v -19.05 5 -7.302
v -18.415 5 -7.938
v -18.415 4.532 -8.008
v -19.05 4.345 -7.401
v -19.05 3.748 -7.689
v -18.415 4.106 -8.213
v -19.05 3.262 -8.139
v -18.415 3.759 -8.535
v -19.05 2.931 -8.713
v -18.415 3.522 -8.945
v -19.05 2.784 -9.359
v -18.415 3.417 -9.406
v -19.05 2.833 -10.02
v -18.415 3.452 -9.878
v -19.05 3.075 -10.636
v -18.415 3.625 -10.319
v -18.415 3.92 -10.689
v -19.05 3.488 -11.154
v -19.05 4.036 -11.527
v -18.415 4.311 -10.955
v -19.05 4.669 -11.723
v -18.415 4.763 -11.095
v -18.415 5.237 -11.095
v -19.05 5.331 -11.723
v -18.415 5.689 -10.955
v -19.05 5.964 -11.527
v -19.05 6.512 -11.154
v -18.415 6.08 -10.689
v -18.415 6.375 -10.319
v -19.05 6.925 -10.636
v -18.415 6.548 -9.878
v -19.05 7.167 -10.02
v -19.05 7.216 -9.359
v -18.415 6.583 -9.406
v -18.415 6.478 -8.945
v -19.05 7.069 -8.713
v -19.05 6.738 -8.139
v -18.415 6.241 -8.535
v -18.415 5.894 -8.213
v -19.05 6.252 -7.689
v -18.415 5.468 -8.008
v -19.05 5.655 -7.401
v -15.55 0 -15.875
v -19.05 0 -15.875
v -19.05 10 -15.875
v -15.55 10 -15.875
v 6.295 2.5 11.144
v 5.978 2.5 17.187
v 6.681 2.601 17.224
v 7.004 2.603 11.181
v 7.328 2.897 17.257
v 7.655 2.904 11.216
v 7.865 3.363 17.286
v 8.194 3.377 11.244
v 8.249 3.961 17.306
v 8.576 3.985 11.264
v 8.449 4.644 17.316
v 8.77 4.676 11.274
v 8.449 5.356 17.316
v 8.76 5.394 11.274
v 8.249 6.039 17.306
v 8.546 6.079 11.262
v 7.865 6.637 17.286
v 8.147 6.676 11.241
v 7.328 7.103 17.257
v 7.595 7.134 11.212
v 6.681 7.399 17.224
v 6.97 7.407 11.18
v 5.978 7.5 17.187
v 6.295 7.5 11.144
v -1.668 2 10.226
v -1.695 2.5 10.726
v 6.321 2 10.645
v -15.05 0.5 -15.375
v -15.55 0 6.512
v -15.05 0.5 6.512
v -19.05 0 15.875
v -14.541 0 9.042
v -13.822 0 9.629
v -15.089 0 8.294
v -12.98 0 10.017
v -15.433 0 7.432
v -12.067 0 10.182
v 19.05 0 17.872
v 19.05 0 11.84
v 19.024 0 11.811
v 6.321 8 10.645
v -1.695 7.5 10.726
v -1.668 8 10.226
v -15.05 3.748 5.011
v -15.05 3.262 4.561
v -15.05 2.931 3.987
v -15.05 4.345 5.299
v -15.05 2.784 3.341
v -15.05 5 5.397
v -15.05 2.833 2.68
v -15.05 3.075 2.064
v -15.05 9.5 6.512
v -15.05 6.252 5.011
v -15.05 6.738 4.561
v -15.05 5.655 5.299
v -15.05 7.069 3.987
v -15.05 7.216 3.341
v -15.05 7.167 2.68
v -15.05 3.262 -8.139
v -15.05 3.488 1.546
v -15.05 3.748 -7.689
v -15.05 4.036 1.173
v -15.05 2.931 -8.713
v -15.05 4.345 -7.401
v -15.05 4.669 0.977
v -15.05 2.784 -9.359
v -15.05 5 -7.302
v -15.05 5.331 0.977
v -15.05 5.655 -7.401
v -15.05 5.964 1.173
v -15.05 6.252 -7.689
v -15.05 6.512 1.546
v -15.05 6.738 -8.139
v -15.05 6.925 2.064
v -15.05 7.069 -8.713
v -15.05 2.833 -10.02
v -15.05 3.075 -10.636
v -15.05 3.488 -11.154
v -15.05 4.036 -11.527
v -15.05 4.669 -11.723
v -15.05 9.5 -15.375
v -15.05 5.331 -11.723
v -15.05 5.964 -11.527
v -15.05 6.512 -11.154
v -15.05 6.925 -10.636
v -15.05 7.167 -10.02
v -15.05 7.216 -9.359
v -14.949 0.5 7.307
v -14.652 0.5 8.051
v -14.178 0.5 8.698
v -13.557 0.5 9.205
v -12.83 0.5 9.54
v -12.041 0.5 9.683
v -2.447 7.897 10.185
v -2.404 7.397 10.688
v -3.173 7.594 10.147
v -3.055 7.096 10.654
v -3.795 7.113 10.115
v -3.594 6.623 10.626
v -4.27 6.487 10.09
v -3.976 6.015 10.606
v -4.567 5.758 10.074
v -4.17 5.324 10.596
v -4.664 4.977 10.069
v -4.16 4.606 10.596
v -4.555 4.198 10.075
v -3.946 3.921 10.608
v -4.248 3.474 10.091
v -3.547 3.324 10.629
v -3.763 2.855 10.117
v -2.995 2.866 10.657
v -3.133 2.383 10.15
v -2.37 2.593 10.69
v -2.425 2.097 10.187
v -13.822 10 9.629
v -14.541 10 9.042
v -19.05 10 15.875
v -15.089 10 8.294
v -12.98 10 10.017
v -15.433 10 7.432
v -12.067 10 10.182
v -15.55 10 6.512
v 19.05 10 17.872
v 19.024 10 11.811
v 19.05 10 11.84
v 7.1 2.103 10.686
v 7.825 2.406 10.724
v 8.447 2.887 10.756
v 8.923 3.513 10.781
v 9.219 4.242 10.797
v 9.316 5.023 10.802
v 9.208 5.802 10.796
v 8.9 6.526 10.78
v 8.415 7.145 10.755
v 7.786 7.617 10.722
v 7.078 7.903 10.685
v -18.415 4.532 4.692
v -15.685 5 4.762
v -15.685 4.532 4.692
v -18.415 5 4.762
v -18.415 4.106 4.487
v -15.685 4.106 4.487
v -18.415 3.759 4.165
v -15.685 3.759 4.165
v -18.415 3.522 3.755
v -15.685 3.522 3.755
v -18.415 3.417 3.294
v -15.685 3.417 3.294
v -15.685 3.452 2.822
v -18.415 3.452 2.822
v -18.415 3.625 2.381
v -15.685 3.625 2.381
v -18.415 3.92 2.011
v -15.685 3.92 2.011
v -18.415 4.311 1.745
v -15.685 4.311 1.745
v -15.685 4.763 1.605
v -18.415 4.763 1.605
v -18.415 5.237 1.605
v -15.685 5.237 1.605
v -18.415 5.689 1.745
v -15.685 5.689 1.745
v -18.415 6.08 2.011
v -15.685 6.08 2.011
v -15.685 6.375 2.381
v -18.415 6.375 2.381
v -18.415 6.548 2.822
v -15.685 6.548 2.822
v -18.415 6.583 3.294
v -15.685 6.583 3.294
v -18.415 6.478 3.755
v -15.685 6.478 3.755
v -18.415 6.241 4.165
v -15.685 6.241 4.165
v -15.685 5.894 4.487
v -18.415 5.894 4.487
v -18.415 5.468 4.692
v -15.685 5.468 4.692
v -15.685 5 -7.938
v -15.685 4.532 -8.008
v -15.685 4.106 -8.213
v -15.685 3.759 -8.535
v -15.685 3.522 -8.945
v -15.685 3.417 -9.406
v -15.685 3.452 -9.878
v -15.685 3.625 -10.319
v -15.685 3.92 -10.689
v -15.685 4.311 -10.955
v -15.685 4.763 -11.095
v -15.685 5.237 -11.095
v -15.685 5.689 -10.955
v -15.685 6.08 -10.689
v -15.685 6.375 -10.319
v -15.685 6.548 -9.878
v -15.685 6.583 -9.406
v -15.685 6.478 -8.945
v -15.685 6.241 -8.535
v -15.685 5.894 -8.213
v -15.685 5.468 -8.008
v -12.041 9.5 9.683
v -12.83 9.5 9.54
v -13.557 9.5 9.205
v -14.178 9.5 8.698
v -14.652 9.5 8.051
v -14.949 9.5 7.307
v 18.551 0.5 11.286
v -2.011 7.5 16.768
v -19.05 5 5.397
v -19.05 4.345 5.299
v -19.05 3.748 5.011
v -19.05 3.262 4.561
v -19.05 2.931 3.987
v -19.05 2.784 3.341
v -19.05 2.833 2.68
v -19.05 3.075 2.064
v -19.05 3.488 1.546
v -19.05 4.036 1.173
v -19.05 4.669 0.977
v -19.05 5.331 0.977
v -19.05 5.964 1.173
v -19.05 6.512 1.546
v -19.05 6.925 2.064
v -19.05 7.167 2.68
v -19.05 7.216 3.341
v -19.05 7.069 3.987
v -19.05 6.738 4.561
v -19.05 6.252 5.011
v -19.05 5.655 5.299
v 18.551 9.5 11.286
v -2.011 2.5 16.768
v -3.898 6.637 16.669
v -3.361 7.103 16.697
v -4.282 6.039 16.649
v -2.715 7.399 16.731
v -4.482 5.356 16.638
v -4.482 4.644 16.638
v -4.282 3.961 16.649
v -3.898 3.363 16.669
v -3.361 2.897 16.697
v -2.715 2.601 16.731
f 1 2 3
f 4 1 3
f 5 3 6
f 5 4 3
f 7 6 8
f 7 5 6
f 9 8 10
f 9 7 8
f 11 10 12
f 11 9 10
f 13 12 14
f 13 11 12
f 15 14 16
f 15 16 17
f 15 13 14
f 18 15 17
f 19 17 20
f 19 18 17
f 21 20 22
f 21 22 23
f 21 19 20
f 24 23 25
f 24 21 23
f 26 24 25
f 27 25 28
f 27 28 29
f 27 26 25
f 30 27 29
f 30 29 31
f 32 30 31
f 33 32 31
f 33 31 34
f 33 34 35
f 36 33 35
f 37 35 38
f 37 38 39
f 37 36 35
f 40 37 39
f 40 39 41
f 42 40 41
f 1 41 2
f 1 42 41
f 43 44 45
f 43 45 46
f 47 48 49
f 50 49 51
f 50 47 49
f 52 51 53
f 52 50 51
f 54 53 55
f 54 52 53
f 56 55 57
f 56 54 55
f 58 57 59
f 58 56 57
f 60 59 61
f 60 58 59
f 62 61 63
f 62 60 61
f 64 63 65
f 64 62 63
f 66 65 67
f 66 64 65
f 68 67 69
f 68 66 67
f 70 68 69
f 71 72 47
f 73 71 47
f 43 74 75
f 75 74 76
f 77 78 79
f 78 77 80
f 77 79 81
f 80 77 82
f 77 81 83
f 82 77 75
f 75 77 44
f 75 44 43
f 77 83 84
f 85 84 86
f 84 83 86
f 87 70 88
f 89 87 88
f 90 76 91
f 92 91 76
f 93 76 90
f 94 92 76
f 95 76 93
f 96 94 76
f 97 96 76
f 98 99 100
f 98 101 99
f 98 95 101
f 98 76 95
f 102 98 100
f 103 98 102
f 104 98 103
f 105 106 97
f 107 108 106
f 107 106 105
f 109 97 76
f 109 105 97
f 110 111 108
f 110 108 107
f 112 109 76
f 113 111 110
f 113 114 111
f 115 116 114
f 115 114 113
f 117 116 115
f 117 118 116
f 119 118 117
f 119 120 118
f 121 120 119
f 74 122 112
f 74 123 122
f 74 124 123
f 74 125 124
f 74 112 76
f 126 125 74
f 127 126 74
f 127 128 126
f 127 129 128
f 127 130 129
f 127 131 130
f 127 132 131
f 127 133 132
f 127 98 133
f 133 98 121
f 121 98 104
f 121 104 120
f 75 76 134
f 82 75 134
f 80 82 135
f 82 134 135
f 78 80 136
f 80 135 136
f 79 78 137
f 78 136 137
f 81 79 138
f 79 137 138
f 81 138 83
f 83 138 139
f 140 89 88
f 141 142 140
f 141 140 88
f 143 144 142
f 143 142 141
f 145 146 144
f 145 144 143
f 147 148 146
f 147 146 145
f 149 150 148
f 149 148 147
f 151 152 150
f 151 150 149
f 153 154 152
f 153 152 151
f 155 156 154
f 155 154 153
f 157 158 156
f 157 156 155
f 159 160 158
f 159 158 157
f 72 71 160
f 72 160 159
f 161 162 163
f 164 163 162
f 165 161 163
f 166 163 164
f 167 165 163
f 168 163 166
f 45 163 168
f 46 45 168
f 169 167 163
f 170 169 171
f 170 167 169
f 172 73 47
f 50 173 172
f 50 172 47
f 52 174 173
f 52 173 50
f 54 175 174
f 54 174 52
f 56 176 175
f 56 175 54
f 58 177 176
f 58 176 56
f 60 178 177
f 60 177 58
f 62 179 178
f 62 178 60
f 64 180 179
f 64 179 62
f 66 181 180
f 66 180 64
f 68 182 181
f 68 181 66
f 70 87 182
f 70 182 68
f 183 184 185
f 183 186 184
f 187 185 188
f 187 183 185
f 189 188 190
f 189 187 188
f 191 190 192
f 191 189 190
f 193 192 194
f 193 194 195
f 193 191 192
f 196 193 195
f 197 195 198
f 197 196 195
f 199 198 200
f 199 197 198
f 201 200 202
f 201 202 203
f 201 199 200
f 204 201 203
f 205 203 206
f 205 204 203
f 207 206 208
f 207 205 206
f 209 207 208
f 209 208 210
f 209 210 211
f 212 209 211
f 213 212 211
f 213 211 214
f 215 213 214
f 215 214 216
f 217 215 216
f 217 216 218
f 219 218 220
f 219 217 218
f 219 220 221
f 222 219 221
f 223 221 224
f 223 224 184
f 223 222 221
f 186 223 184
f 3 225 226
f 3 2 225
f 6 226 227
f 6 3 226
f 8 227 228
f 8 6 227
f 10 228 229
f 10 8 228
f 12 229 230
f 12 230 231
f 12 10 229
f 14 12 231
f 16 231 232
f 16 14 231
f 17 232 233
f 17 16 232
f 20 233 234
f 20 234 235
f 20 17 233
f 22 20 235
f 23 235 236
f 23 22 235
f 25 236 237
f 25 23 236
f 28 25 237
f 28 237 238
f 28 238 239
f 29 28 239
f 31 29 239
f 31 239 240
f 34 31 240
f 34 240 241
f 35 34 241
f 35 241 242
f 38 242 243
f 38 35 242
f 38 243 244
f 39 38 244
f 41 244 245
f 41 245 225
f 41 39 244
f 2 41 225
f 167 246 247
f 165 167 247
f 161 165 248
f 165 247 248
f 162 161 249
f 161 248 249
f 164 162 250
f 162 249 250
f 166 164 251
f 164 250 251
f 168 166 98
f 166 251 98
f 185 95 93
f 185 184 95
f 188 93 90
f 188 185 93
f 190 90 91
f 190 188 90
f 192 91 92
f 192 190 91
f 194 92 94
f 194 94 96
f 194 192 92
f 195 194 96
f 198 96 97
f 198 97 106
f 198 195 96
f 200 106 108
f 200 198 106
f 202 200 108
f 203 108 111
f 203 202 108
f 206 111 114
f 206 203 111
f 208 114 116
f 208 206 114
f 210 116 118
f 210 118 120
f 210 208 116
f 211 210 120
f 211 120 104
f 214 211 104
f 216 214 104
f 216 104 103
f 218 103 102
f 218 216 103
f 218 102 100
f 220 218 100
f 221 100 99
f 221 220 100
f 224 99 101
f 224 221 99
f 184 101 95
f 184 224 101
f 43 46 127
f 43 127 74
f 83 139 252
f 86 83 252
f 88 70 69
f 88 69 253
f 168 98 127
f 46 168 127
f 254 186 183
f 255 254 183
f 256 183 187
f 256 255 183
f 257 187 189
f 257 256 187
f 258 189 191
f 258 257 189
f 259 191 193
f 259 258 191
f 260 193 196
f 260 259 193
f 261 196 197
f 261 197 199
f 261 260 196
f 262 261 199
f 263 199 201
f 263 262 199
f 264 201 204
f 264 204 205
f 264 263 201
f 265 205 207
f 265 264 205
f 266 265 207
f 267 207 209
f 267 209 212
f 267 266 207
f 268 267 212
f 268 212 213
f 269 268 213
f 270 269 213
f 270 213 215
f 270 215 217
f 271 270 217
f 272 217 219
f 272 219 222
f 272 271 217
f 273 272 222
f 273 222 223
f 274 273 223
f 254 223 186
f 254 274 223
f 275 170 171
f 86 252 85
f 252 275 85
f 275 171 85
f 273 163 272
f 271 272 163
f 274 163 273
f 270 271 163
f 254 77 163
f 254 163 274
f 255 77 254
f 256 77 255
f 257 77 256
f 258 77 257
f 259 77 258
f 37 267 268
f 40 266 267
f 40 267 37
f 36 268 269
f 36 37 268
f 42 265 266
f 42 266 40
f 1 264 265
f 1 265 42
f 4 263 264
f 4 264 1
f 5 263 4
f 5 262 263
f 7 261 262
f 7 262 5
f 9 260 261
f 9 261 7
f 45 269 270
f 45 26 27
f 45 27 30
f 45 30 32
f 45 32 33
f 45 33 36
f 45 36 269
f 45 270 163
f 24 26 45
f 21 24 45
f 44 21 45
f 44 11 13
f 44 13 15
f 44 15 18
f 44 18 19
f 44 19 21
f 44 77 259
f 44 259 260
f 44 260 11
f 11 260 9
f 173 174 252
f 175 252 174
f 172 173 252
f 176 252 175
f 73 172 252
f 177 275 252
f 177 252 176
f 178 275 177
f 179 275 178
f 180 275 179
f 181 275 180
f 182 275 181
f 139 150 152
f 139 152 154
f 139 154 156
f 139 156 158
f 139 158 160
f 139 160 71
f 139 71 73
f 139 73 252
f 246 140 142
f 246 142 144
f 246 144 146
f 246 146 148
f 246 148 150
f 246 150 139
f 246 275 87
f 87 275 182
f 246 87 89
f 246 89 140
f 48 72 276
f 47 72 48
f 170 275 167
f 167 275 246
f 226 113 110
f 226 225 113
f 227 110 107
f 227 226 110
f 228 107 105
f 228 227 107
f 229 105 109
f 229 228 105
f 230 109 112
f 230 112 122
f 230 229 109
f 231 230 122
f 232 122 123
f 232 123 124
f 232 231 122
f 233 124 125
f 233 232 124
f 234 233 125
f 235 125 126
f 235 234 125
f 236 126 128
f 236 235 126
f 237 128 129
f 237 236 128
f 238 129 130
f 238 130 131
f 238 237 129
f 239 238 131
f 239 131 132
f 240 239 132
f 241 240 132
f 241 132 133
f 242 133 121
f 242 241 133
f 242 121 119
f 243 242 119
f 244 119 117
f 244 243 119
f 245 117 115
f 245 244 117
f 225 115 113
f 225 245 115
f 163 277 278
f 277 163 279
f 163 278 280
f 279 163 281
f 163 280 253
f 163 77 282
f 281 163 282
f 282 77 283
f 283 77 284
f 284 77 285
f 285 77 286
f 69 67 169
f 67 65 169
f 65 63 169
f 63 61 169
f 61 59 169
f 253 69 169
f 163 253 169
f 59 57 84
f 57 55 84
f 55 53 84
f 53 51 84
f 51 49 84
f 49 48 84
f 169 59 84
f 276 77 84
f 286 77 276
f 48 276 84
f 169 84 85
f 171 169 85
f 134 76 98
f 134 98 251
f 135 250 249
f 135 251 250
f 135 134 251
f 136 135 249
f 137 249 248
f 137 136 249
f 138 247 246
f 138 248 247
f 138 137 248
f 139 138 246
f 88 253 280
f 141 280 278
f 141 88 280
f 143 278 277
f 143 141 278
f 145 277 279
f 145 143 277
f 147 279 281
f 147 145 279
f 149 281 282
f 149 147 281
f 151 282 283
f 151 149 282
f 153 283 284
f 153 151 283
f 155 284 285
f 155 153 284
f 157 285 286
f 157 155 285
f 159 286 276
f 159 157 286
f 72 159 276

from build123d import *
from OCP.BRepFilletAPI import BRepFilletAPI_MakeChamfer

# Parameters (mm, degrees)
SKETCH1_W                             = 38.1
SKETCH1_H                             = 31.75
BOSS_EXTRUDE1_DEPTH                   = 10
CUT_EXTRUDE1_REACH                    = 28.738
SKETCH2_W                             = 34.1
SKETCH2_H                             = 25.4
F_1_8_0_125_DIAMETER_HOLE1_AT_2_COUNT = 2
F_1_8_0_125_DIAMETER_HOLE1_AT_2_PITCH = 12.7
DRAFT1_ANGLE                          = 3
CUT_EXTRUDE2_DEPTH                    = 28.969652512
CUT_EXTRUDE3_DEPTH                    = 35.177500808
FILLET2_R                             = 3.175
CHAMFER1_SIZE                         = 0.5
CHAMFER2_SIZE                         = 0.5
CHAMFER2_SIZE2                        = 0.528377251


with BuildPart() as part:
    # Sketch1 → Boss-Extrude1 (new body)
    with BuildSketch(Plane(origin=(0, 0, 0), x_dir=(1, 0, 0), z_dir=(0, 1, 0))):
        Rectangle(SKETCH1_W, SKETCH1_H)
    extrude(amount=BOSS_EXTRUDE1_DEPTH)

    # Sketch2 → Cut-Extrude1 (cut, up to next)
    with BuildSketch(Plane(origin=(0, 10, 0), x_dir=(1, 0, 0), z_dir=(0, 1, 0)), mode=Mode.PRIVATE) as cut_extrude1_sk1:
        with Locations((2, 3.175)):
            Rectangle(SKETCH2_W, SKETCH2_H)
    cut_extrude1_tool1 = extrude(cut_extrude1_sk1.sketch, amount=-CUT_EXTRUDE1_REACH, mode=Mode.PRIVATE) & part.part
    add(cut_extrude1_tool1.solids().sort_by_distance((2, 10, -3.175))[0], mode=Mode.SUBTRACT)

    # Sketch3 → 1/8 (0.125) Diameter Hole1 (revolve, cut)
    with BuildSketch(Plane(origin=(-19.05, 5, -9.525), x_dir=(0, 0, 1), z_dir=(0, 1, 0))):
        Polygon((0, 0), (0, 4), (2.2225, 4), (1.5875, 3.365), (1.5875, 0.635), (2.2225, 0), align=None)
    f_1_8_0_125_diameter_hole1 = revolve(axis=Axis((-25.4, 5, -9.525), (1, 0, 0)), mode=Mode.SUBTRACT)

    # 1/8 (0.125) Diameter Hole1 at 2: 1/8 (0.125) Diameter Hole1 ×2
    with Locations(*[(0, 0, i * F_1_8_0_125_DIAMETER_HOLE1_AT_2_PITCH) for i in range(1, F_1_8_0_125_DIAMETER_HOLE1_AT_2_COUNT)]):
        add(f_1_8_0_125_diameter_hole1, mode=Mode.SUBTRACT)

    # Draft1
    draft1_faces = [part.faces().sort_by_distance(p)[0] for p in [
        (0, 5, 15.875),
    ]]
    draft(draft1_faces, Plane(origin=(-19.05, 10, 15.875), x_dir=(0, 0, -1), z_dir=(-1, 0, 0)), DRAFT1_ANGLE)

    # Sketch7 → Cut-Extrude2 (cut, through all)
    with BuildSketch(Plane(origin=(0, 10, 0), x_dir=(1, 0, 0), z_dir=(0, 1, 0))):
        Polygon((-15.05, -9.525), (19.05, -9.525), (19.05, -11.312105274), align=None)
    extrude(amount=-CUT_EXTRUDE2_DEPTH, mode=Mode.SUBTRACT)

    # Sketch8 → Cut-Extrude3 (cut, through all)
    with BuildSketch(Plane(origin=(-0.539039544, 0, 10.285487213), x_dir=(-0.9986295347545739, 0, -0.05233595624294398), z_dir=(0.05233595624294399, 0, -0.998629534754574))):
        with BuildLine():
            Line((-6.869125485, 7.5), (1.130874515, 7.5))
            ThreePointArc((1.130874515, 7.5), (3.630874515, 5), (1.130874515, 2.5))
            Line((1.130874515, 2.5), (-6.869125485, 2.5))
            ThreePointArc((-6.869125485, 2.5), (-9.369125485, 5), (-6.869125485, 7.5))
        make_face()
    extrude(amount=-CUT_EXTRUDE3_DEPTH, mode=Mode.SUBTRACT)

    # Fillet2
    fillet2_edges = [part.edges().sort_by_distance(p)[0] for p in [
        (-15.05, 5, 9.525),
    ]]
    fillet(fillet2_edges, radius=FILLET2_R)

    # Chamfer1
    chamfer1_edges = [part.edges().sort_by_distance(p)[0] for p in [
        (8.817245881, 5, 10.775829354),
        (2.326153905, 2.5, 10.435645639),
        (-4.164938071, 5, 10.095461923),
        (2.326153905, 7.5, 10.435645639),
    ]]
    chamfer(chamfer1_edges, length=CHAMFER1_SIZE)

    # Chamfer2: one chamfer whose edges measure the first distance from different faces: ONE call of the kernel's chamfer builder (chamfer() names one face for all edges)
    chamfer2_edges_1 = [part.edges().sort_by_distance(p)[0] for p in [
        (-15.05, 0, -4.68148125),
        (-15.05, 5, -15.875),
        (-15.05, 10, -4.68148125),
        (3.504416669, 10, 10.497395774),
        (3.504416669, 0, 10.497395774),
        (-14.178063628, 10, 8.697563279),
        (-14.178063628, 0, 8.697563279),
    ]]
    chamfer2_edges_2 = [part.edges().sort_by_distance(p)[0] for p in [
        (19.05, 5, 11.312105274),
    ]]
    chamfer2_side_2 = [part.faces().sort_by_distance(p)[0] for p in [
        (9.643116423, 5, 10.819111395),
    ]]
    chamfer2 = BRepFilletAPI_MakeChamfer(part.part.solid().wrapped)
    for e in chamfer2_edges_1:
        chamfer2.Add(CHAMFER2_SIZE, e.wrapped)
    for e in chamfer2_edges_2:
        chamfer2.Add(CHAMFER2_SIZE, CHAMFER2_SIZE2, e.wrapped, chamfer2_side_2[0].wrapped)  # the first distance lies on this face
    add(Compound.cast(chamfer2.Shape()), mode=Mode.REPLACE)


solid = part.part
